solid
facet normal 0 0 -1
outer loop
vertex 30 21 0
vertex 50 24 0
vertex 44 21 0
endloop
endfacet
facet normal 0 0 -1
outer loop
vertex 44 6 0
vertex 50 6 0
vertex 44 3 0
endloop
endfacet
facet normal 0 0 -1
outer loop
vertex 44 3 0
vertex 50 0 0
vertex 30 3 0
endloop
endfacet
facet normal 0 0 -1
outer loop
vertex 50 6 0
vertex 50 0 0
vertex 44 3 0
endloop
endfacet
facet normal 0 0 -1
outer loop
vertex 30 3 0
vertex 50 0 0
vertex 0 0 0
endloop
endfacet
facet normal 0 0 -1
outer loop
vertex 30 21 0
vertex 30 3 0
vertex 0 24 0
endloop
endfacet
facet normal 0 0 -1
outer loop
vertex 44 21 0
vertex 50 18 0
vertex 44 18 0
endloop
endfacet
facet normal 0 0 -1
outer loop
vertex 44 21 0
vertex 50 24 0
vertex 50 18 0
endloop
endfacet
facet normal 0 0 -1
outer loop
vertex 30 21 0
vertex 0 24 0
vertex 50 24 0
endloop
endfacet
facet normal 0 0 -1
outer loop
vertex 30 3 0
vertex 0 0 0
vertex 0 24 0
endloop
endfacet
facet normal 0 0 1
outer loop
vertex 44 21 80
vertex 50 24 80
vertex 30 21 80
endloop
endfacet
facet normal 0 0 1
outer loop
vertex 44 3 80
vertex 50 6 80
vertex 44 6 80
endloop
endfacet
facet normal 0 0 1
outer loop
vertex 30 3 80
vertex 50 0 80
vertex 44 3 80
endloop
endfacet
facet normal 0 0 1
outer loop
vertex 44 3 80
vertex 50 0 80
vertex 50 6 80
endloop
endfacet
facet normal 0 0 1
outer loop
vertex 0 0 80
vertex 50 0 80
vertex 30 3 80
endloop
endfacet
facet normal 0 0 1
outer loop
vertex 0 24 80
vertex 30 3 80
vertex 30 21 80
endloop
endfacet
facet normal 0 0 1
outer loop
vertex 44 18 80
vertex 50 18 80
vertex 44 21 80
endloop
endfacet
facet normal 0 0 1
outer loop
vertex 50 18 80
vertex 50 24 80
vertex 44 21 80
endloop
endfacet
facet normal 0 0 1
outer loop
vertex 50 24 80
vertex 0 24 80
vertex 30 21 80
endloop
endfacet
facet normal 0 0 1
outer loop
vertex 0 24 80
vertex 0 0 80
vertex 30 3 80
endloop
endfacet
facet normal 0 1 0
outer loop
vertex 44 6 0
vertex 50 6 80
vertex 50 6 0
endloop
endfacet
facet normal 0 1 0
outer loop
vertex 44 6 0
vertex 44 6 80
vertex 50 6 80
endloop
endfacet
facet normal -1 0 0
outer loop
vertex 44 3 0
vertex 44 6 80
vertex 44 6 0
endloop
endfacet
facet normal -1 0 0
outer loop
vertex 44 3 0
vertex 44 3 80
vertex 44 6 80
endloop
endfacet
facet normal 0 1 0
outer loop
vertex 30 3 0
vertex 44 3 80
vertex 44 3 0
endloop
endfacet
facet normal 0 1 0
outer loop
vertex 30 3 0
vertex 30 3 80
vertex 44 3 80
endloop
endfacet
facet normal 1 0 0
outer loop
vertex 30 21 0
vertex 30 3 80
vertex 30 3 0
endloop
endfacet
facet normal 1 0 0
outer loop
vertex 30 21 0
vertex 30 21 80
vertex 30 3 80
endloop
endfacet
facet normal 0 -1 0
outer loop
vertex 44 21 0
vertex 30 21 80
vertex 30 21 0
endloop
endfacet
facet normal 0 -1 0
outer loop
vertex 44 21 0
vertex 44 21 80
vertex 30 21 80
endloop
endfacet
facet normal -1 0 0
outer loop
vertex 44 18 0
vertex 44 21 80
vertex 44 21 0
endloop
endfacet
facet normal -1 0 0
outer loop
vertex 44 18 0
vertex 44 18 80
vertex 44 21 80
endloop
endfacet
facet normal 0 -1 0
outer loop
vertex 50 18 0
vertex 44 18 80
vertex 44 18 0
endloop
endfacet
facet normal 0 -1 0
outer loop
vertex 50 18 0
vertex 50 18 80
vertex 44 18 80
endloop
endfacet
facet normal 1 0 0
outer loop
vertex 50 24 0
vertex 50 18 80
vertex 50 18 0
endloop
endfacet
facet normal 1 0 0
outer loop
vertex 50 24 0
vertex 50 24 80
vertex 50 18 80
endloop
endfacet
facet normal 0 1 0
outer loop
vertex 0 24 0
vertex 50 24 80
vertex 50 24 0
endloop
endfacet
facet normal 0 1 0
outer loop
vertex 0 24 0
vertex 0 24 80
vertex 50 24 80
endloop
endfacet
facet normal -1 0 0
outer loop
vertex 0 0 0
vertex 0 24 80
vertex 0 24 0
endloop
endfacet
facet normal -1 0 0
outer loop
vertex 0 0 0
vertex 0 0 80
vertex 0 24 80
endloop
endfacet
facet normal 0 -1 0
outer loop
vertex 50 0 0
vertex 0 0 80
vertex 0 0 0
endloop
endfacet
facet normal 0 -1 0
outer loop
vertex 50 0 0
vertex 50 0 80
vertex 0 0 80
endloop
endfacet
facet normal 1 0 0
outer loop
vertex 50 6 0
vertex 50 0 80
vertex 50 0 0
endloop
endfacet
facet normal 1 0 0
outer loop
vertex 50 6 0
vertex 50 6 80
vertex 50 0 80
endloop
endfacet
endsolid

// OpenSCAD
$fn = 32;

// ----------------------------------------------------------------------
// T-slot rail: 50 x 24 mm section, 80 mm long
// ----------------------------------------------------------------------

// --- parameters (mm) ---
profile_height = 80;      // extrusion height
profile_points = 12;      // points of the closed outline

profile = [[0, 0], [50, 0], [50, 6], [44, 6], [44, 3], [30, 3], [30, 21], [44, 21], [44, 18], [50, 18], [50, 24], [0, 24]];  // single closed polygon, 12 points, counter clockwise

// --- the one profile operation ---
linear_extrude(height = profile_height) polygon(points = profile);
